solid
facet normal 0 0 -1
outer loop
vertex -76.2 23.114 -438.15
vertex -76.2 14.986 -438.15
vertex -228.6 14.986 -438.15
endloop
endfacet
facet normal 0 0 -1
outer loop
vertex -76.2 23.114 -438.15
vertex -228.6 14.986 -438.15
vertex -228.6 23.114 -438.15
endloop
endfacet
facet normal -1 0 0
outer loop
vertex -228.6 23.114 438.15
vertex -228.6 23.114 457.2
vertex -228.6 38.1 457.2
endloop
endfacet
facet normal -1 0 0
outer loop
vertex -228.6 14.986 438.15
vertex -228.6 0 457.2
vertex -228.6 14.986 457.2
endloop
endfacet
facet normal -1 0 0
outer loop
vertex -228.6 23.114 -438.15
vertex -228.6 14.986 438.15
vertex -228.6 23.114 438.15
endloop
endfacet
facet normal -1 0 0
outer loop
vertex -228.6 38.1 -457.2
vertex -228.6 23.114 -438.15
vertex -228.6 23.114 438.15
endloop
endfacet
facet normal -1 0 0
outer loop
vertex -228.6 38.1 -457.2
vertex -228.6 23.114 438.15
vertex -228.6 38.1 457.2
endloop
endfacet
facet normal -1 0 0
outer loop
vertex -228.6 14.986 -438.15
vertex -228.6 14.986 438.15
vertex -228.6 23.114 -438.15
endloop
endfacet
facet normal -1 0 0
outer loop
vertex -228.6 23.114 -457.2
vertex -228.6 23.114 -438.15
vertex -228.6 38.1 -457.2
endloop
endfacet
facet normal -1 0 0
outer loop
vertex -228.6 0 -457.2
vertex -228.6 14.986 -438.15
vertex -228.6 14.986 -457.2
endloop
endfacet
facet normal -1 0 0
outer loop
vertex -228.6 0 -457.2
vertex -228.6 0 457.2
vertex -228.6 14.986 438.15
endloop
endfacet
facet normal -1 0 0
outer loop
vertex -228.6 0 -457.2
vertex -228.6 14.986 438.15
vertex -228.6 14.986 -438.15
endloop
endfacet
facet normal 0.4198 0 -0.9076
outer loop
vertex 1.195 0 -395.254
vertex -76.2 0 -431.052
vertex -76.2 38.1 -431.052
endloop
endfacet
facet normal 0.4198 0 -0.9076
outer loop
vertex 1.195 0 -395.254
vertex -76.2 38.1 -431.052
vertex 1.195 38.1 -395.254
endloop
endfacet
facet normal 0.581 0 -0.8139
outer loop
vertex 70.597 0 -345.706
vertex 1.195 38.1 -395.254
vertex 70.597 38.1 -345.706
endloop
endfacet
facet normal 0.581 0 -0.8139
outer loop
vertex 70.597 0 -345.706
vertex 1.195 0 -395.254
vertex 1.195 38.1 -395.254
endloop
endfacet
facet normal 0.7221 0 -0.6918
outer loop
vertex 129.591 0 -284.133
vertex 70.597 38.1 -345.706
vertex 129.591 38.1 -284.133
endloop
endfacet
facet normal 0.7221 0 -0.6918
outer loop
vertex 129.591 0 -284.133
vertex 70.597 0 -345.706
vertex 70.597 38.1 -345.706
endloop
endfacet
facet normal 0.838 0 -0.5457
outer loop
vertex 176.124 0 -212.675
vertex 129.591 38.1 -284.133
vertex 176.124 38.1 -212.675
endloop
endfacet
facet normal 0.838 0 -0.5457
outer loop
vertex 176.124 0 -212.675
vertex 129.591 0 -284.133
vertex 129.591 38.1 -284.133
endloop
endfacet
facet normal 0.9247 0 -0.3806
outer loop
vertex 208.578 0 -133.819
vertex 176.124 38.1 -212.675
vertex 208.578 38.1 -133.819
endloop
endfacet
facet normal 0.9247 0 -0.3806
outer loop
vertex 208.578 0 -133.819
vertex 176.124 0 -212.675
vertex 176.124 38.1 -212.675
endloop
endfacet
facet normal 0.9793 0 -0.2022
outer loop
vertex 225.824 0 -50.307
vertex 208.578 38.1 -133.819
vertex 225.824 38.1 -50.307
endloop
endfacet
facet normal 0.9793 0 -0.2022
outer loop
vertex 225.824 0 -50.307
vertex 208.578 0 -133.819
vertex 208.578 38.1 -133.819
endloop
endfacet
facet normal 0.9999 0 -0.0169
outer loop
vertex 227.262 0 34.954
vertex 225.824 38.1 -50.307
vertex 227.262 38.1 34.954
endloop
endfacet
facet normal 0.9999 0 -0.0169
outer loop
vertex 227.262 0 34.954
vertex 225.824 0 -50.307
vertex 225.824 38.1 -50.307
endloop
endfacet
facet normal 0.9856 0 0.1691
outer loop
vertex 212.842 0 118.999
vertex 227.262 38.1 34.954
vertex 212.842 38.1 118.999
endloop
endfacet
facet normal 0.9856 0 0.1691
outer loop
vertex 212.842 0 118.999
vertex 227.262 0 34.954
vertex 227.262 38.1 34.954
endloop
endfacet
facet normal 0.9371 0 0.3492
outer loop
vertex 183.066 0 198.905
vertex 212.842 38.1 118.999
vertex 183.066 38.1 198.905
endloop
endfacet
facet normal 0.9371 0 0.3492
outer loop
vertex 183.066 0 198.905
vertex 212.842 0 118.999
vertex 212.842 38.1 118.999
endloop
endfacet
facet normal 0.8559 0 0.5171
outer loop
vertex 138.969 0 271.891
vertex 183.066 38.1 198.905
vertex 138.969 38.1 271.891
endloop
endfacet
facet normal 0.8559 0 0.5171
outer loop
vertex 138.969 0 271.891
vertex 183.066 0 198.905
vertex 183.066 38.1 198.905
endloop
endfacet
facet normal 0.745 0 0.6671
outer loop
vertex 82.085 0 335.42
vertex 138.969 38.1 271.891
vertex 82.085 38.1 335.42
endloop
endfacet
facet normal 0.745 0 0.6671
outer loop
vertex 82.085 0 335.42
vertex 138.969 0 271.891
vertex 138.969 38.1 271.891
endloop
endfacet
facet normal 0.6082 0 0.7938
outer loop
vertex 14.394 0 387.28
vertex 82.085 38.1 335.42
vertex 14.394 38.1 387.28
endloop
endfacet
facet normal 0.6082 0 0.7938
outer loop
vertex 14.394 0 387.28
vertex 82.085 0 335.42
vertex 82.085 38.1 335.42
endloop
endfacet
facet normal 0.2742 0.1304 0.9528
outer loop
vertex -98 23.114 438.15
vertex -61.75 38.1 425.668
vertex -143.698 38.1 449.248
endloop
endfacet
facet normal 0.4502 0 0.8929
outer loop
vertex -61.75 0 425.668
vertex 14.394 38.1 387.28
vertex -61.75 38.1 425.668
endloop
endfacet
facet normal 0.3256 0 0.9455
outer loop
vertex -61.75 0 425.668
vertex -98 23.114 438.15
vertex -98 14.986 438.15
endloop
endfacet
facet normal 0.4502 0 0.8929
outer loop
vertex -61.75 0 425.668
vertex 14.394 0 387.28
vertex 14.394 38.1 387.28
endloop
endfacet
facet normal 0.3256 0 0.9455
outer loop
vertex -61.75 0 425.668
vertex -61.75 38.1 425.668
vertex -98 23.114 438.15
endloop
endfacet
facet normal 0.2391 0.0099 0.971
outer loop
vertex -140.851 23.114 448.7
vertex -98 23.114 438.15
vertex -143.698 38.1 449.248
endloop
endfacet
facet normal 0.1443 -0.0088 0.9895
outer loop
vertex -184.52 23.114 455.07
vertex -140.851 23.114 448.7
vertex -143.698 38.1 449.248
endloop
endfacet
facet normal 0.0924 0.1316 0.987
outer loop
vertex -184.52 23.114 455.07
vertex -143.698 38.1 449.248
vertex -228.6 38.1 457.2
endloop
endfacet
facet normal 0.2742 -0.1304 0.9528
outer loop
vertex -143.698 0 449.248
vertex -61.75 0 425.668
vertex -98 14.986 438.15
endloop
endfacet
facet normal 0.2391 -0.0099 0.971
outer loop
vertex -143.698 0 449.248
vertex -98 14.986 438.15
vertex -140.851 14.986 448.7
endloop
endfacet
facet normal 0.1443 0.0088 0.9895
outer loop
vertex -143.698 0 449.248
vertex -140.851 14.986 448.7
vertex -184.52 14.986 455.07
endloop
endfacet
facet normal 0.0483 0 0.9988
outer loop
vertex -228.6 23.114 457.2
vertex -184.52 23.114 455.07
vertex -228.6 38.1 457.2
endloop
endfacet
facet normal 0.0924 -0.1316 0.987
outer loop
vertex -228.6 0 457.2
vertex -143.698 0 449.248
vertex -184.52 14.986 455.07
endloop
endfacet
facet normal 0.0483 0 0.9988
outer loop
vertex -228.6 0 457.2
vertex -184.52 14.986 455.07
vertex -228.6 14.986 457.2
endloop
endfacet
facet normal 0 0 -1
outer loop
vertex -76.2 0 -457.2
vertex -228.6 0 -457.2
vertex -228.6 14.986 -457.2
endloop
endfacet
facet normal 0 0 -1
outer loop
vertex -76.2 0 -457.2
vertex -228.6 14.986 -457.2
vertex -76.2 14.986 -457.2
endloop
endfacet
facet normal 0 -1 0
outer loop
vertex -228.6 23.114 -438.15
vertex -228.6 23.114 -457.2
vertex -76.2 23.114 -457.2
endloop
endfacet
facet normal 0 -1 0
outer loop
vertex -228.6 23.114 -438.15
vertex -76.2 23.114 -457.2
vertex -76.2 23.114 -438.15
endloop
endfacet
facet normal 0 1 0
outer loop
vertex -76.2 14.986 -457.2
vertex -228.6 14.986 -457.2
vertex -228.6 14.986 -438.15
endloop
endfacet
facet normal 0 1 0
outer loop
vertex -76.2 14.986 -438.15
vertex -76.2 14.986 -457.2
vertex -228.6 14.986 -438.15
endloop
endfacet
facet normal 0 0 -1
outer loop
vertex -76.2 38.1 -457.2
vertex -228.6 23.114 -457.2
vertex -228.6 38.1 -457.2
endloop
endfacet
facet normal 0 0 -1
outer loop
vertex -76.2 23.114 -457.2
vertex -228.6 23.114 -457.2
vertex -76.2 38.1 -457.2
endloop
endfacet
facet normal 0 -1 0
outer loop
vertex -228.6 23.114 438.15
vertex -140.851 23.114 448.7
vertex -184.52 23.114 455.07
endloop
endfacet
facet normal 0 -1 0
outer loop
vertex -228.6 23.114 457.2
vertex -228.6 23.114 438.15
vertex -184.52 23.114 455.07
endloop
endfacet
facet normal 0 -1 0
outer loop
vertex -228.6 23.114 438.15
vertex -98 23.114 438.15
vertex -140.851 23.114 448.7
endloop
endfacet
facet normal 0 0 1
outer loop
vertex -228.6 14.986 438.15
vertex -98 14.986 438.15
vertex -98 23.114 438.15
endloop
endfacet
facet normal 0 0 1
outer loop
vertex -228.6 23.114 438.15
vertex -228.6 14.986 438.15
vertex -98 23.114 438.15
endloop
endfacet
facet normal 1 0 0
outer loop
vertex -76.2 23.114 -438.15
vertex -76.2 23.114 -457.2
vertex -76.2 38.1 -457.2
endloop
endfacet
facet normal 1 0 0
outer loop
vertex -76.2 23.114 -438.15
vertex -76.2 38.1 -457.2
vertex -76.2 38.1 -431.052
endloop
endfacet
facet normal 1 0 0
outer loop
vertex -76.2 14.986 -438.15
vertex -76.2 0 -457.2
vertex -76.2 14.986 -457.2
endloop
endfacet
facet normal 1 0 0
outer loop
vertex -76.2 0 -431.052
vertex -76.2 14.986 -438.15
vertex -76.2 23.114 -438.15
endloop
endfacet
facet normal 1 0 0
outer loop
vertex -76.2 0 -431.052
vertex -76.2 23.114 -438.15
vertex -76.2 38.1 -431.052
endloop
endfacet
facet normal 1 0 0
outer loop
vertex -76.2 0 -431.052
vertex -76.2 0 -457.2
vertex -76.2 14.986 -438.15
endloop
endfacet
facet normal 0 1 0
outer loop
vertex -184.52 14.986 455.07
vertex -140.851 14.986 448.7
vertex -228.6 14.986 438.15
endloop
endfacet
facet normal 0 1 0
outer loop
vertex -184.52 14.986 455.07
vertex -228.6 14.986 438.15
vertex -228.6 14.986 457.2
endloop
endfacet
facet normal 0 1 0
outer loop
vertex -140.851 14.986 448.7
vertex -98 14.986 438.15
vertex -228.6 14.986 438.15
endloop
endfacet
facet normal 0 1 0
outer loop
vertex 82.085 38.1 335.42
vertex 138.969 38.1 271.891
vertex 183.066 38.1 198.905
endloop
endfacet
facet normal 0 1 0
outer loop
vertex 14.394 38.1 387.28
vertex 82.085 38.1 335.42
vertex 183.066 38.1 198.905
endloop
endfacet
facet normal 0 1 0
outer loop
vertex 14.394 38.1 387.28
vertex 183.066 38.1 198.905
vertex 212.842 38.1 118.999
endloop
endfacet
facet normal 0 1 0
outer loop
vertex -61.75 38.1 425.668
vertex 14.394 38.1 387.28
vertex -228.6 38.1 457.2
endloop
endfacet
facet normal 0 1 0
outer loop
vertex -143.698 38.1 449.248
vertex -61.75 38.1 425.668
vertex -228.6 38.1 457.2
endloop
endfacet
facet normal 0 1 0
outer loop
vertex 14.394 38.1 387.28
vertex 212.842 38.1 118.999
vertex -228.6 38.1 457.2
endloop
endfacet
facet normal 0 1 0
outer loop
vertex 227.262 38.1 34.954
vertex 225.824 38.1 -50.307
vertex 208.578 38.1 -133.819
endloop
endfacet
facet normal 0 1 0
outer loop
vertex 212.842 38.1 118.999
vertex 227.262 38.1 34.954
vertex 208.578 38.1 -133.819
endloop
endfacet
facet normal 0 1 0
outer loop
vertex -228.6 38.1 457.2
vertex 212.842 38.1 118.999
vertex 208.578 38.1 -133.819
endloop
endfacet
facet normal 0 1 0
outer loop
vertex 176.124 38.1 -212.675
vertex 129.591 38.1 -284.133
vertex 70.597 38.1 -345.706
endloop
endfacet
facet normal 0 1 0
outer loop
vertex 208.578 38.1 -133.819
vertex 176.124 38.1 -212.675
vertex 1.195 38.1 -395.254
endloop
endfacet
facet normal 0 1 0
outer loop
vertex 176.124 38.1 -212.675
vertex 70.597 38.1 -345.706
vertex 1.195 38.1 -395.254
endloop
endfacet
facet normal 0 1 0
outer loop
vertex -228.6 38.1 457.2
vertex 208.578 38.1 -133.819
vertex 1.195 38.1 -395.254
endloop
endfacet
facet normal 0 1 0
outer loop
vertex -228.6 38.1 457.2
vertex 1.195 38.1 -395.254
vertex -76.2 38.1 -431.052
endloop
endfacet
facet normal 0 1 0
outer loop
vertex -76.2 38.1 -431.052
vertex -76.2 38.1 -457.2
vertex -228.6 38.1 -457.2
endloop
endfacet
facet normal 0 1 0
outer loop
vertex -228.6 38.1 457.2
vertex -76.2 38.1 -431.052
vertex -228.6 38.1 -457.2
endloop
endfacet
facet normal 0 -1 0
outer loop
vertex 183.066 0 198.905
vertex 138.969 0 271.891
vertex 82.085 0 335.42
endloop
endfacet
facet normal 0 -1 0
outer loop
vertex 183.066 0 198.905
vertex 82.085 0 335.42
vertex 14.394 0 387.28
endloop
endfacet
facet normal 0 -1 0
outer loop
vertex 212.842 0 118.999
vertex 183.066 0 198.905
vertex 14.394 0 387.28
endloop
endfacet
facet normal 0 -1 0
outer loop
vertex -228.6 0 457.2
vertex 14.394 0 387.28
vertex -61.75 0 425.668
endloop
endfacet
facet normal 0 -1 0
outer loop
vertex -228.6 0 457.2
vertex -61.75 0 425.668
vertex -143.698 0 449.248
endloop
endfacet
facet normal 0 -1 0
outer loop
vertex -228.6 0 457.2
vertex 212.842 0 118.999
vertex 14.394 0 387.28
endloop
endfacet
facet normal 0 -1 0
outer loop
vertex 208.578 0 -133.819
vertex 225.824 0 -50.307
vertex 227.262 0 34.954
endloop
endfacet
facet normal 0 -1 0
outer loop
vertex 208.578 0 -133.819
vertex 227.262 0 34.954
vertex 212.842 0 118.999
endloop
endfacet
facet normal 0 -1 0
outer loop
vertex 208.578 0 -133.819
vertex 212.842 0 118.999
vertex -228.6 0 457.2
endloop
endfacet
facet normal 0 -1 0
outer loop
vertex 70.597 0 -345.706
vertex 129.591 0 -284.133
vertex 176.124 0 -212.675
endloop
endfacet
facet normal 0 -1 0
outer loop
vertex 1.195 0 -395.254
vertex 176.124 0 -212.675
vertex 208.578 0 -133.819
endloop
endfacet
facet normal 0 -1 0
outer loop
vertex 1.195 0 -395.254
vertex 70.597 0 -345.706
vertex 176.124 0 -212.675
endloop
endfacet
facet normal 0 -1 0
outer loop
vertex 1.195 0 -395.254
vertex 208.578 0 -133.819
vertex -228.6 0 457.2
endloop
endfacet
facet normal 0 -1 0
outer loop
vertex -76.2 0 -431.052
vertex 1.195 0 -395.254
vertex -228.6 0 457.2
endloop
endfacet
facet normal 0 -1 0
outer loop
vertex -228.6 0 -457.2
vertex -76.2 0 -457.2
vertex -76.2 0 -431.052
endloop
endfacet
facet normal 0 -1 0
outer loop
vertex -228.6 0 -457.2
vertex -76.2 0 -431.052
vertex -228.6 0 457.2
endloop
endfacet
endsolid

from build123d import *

# Parameters (mm, degrees)
BOSS_EXTRUDE1_DEPTH = 38.1
SKETCH2_W           = 38.1
SKETCH2_H           = 8.128
CUT_EXTRUDE1_DEPTH  = 458.2


with BuildPart() as part:
    # Sketch1 → Boss-Extrude1 (new body)
    with BuildSketch(Plane(origin=(0, 0, 0), x_dir=(1, 0, 0), z_dir=(0, 1, 0))):
        with BuildLine():
            Line((-228.6, 457.2), (-76.2, 457.2))
            Line((-76.2, 457.2), (-76.2, 431.052293811))
            ThreePointArc((-76.2, 431.052293811), (222.015661474, -77.313424673), (-228.6, -457.2))
            Line((-228.6, -457.2), (-228.6, 457.2))
        make_face()
    extrude(amount=BOSS_EXTRUDE1_DEPTH)

    # Sketch2 → Cut-Extrude1 (cut, through all)
    with BuildSketch(Plane.ZY.offset(228.6)):
        with Locations((457.2, 19.05)):
            Rectangle(SKETCH2_W, SKETCH2_H)
        with Locations((-457.2, 19.05)):
            Rectangle(SKETCH2_W, SKETCH2_H)
    extrude(amount=-CUT_EXTRUDE1_DEPTH, mode=Mode.SUBTRACT)


solid = part.part
